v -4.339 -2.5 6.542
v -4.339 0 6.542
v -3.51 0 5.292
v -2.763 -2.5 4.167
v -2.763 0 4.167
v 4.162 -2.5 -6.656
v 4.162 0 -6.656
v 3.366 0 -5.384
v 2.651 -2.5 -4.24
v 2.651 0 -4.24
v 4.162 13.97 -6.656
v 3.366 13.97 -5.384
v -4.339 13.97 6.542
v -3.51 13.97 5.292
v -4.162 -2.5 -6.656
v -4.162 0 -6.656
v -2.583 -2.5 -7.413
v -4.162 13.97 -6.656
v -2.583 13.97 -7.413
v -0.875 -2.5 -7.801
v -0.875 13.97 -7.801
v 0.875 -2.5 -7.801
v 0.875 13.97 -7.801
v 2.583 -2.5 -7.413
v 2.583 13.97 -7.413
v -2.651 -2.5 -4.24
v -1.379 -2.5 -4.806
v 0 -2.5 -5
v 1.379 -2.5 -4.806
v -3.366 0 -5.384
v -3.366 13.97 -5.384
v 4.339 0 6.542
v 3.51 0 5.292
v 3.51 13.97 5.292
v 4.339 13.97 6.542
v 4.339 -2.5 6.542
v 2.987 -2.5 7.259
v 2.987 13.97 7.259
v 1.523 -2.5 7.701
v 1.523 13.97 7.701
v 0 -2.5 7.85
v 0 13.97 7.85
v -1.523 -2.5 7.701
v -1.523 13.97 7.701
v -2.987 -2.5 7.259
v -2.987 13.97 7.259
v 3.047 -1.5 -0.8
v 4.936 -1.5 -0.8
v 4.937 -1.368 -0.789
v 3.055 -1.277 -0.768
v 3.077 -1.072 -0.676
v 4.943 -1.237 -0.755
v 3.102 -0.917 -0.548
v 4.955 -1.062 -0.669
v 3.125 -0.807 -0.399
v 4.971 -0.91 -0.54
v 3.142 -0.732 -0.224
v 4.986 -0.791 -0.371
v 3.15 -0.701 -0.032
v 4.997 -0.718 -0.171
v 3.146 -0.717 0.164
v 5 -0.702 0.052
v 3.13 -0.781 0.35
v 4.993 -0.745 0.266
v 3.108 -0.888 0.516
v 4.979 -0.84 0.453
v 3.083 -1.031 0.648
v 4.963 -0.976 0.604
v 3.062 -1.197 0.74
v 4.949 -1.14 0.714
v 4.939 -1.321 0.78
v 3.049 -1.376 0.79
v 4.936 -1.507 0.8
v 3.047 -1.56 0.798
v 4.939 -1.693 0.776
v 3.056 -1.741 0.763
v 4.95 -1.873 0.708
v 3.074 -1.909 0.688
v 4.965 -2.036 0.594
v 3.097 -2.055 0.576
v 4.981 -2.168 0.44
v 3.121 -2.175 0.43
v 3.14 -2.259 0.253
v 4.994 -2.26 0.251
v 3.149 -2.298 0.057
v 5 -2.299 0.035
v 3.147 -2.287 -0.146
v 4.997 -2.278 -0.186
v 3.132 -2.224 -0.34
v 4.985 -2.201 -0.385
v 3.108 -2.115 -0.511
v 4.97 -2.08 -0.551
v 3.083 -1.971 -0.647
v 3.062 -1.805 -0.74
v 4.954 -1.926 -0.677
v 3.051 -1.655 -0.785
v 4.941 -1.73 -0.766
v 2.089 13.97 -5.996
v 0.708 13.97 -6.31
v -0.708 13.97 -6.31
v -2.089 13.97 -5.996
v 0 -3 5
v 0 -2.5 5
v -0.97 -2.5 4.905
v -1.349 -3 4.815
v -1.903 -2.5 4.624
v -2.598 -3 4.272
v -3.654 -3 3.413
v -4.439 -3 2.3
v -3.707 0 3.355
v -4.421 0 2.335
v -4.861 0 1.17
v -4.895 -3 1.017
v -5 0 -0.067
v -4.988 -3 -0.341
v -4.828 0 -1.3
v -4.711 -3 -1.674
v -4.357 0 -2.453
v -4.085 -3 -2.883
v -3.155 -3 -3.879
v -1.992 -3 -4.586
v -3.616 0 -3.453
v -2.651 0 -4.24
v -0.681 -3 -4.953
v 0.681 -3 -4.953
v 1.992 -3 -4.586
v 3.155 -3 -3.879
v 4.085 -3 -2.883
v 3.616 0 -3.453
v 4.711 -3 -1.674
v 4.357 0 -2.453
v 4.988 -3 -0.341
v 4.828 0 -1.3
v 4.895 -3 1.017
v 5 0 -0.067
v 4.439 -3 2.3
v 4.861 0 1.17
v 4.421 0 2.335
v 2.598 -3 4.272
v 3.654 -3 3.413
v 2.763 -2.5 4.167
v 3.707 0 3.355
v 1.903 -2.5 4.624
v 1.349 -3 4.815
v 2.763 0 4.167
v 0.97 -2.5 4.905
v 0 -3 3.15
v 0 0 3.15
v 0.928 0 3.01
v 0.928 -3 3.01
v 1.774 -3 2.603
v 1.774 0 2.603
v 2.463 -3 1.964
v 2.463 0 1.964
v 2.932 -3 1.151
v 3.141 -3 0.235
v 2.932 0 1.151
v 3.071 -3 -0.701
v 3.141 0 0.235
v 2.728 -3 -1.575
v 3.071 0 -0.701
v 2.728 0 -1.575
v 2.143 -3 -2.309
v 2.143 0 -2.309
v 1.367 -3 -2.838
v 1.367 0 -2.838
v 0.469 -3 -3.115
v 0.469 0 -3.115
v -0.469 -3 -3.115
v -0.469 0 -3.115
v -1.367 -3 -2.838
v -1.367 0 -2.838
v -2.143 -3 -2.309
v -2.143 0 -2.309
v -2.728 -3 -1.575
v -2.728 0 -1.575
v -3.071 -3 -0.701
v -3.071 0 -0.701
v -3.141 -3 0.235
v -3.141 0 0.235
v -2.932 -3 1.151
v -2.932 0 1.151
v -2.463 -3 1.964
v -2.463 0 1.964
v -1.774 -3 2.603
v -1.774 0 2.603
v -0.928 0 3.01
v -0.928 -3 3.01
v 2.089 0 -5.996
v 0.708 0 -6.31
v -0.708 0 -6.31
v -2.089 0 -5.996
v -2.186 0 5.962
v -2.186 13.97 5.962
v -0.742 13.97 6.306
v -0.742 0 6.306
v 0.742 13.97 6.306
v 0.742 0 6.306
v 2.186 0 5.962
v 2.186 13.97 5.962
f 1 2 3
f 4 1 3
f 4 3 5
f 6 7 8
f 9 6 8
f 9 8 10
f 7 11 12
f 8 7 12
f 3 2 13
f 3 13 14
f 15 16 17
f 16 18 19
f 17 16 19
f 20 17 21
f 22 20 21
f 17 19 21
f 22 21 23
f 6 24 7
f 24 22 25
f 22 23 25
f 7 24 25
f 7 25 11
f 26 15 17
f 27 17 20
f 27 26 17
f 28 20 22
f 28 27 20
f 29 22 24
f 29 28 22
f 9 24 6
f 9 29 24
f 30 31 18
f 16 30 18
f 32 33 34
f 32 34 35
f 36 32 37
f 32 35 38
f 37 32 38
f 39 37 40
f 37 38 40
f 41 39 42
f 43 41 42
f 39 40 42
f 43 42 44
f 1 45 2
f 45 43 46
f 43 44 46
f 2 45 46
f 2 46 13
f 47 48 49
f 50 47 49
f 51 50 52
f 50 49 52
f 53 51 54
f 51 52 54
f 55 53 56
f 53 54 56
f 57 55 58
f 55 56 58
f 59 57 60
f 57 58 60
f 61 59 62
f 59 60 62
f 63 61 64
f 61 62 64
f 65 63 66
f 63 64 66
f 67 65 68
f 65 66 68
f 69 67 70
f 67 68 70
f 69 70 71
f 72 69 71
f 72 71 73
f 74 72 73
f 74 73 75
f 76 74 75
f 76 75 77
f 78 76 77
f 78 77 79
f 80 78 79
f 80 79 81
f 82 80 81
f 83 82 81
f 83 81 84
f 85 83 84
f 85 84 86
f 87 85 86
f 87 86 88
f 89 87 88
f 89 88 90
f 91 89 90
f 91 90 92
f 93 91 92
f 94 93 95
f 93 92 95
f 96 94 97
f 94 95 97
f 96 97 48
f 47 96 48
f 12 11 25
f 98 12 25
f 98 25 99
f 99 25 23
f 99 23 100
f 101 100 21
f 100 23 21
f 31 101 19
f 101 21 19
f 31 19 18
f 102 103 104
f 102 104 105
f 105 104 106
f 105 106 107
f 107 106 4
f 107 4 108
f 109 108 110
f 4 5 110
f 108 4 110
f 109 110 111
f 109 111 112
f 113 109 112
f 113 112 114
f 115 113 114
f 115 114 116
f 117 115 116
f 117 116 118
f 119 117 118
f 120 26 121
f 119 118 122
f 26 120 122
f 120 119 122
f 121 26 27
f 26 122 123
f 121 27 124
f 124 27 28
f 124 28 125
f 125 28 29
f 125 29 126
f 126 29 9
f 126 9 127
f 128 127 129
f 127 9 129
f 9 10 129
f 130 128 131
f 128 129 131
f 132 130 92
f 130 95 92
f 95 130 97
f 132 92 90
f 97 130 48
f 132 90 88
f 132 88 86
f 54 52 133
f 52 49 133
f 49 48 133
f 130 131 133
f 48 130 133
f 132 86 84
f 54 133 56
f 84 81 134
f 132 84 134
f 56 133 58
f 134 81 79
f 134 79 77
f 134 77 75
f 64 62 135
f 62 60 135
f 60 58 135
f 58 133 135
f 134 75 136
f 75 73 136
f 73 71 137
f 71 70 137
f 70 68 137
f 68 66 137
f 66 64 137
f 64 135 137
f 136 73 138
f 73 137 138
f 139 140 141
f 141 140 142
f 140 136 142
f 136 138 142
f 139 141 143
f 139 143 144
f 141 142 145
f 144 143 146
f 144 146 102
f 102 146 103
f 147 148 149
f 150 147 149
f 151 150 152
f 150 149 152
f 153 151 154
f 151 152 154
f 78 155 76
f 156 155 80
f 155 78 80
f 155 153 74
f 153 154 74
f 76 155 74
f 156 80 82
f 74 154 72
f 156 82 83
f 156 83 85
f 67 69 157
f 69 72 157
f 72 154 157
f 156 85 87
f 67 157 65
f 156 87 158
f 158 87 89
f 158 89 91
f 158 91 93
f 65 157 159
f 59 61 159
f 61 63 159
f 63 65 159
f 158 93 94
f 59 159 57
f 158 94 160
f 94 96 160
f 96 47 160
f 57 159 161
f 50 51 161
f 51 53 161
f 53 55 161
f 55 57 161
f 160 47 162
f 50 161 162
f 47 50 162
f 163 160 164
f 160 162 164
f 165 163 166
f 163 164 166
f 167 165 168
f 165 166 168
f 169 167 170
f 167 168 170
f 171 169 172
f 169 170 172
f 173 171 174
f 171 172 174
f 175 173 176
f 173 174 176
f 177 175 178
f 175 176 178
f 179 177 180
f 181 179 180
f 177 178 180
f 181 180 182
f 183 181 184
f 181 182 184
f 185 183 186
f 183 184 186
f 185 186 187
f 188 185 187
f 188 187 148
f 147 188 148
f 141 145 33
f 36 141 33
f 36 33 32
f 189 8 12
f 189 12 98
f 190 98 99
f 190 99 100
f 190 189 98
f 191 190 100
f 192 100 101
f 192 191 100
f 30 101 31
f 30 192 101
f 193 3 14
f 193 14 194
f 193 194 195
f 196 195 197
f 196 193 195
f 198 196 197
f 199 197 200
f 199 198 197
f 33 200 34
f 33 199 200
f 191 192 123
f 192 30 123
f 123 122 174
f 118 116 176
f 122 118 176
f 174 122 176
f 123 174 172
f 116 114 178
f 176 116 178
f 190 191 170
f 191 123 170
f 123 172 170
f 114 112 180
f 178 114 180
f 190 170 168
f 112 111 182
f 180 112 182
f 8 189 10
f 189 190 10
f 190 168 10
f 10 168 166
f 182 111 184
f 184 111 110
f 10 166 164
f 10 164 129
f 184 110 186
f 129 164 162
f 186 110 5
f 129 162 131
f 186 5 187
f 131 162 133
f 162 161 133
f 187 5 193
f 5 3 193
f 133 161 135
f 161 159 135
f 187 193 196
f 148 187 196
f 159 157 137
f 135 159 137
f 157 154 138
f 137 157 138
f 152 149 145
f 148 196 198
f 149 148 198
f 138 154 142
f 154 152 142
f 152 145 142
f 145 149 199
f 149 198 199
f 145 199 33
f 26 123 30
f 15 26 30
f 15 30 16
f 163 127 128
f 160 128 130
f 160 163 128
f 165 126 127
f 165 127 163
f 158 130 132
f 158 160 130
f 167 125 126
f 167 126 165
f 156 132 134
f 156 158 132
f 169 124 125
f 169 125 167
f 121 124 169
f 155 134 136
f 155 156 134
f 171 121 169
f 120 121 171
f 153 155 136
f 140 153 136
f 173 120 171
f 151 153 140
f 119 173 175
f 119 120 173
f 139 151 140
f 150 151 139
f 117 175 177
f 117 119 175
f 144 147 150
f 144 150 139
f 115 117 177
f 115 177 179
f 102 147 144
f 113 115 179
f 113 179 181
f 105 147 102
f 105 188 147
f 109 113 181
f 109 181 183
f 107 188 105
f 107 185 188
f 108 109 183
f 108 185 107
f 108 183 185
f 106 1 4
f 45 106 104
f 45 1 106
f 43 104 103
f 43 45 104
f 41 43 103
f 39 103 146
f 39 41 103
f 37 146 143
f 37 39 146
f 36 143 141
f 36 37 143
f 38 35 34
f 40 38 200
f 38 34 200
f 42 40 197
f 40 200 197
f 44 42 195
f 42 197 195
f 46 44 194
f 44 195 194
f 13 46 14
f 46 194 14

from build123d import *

# Parameters (mm, degrees)
SKETCH1_W                  = 5
SKETCH1_H                  = 3
SKETCH2_R                  = 3.15
CUT_EXTRUDE1_DEPTH         = 8.681145748
M2X0_4_TAPPED_HOLE2_REACH  = 13.576
M2X0_4_TAPPED_HOLE2_BORE_R = 0.8
BOSS_EXTRUDE1_DEPTH        = 13.97
BOSS_EXTRUDE1_2_DEPTH      = 13.97
BOSS_EXTRUDE2_DEPTH        = 2.5


with BuildPart() as part:
    # Sketch1 → Revolve1 (revolve)
    with BuildSketch(Plane.XY, mode=Mode.PRIVATE) as revolve1_sk:
        with Locations((-2.5, -1.5)):
            Rectangle(SKETCH1_W, SKETCH1_H)
    revolve(revolve1_sk.sketch.rotate(Axis((0, 5.888182105, 0), (0, -1, 0)), 270), axis=Axis((0, 5.888182105, 0), (0, -1, 0)))

    # Sketch2 → Cut-Extrude1 (cut, through all)
    with BuildSketch(Plane(origin=(0, 0, 0), x_dir=(1, 0, 0), z_dir=(0, 1, 0))):
        with Locations(Location((0, 0, 0), (0, 0, 270))):
            Circle(SKETCH2_R)
    extrude(amount=-CUT_EXTRUDE1_DEPTH, mode=Mode.SUBTRACT)

    # M2x0.4 Tapped Hole2 bore → M2x0.4 Tapped Hole2 (cut, up to next)
    with BuildSketch(Plane(origin=(5, 0, 0), x_dir=(0, 0, -1), z_dir=(1, 0, 0)), mode=Mode.PRIVATE) as m2x0_4_tapped_hole2_sk1:
        with Locations((0, -1.5)):
            Circle(M2X0_4_TAPPED_HOLE2_BORE_R)
    m2x0_4_tapped_hole2_tool1 = extrude(m2x0_4_tapped_hole2_sk1.sketch, amount=-M2X0_4_TAPPED_HOLE2_REACH, mode=Mode.PRIVATE) & part.part
    add(m2x0_4_tapped_hole2_tool1.solids().sort_by_distance((5, -1.5, 0))[0], mode=Mode.SUBTRACT)



with BuildPart() as body_2:
    # Sketch9 → Boss-Extrude1 (new body)
    with BuildSketch(Plane(origin=(0, 0, 0), x_dir=(1, 0, 0), z_dir=(0, 1, 0))):
        with BuildLine():
            Line((-3.366324533, 5.384269602), (-4.161519304, 6.656144311))
            ThreePointArc((-4.161519304, 6.656144311), (0, 7.85), (4.161519304, 6.656144311))
            Line((4.161519304, 6.656144311), (3.366324533, 5.384269602))
            ThreePointArc((3.366324533, 5.384269602), (0, 6.35), (-3.366324533, 5.384269602))
        make_face()
    extrude(amount=BOSS_EXTRUDE1_DEPTH)


with BuildPart() as body_3:
    # Sketch9 → Boss-Extrude1 2 (new body)
    with BuildSketch(Plane(origin=(0, 0, 0), x_dir=(1, 0, 0), z_dir=(0, 1, 0))):
        with BuildLine():
            Line((3.509629139, -5.291975369), (4.338675392, -6.542048291))
            ThreePointArc((4.338675392, -6.542048291), (0, -7.85), (-4.338675392, -6.542048291))
            Line((-4.338675392, -6.542048291), (-3.509629139, -5.291975369))
            ThreePointArc((-3.509629139, -5.291975369), (0, -6.35), (3.509629139, -5.291975369))
        make_face()
    extrude(amount=BOSS_EXTRUDE1_2_DEPTH)


with BuildPart() as part_1:
    add(part.part)

    add(body_2.part)  # Boss-Extrude2 merges body 2

    add(body_3.part)  # Boss-Extrude2 merges body 3
    # Sketch11 → Boss-Extrude2 (add)
    with BuildSketch(Plane.XZ):
        with BuildLine():
            Line((4.161519304, -6.656144311), (2.650649238, -4.239582363))
            ThreePointArc((2.650649238, -4.239582363), (0, -5), (-2.650649238, -4.239582363))
            Line((-2.650649238, -4.239582363), (-4.161519304, -6.656144311))
            ThreePointArc((-4.161519304, -6.656144311), (0, -7.85), (4.161519304, -6.656144311))
        make_face()
        with BuildLine():
            Line((-4.338675392, 6.542048291), (-2.763487511, 4.166909739))
            ThreePointArc((-2.763487511, 4.166909739), (0, 5), (2.763487511, 4.166909739))
            Line((2.763487511, 4.166909739), (4.338675392, 6.542048291))
            ThreePointArc((4.338675392, 6.542048291), (0, 7.85), (-4.338675392, 6.542048291))
        make_face()
    extrude(amount=BOSS_EXTRUDE2_DEPTH)


solid = part_1.part
